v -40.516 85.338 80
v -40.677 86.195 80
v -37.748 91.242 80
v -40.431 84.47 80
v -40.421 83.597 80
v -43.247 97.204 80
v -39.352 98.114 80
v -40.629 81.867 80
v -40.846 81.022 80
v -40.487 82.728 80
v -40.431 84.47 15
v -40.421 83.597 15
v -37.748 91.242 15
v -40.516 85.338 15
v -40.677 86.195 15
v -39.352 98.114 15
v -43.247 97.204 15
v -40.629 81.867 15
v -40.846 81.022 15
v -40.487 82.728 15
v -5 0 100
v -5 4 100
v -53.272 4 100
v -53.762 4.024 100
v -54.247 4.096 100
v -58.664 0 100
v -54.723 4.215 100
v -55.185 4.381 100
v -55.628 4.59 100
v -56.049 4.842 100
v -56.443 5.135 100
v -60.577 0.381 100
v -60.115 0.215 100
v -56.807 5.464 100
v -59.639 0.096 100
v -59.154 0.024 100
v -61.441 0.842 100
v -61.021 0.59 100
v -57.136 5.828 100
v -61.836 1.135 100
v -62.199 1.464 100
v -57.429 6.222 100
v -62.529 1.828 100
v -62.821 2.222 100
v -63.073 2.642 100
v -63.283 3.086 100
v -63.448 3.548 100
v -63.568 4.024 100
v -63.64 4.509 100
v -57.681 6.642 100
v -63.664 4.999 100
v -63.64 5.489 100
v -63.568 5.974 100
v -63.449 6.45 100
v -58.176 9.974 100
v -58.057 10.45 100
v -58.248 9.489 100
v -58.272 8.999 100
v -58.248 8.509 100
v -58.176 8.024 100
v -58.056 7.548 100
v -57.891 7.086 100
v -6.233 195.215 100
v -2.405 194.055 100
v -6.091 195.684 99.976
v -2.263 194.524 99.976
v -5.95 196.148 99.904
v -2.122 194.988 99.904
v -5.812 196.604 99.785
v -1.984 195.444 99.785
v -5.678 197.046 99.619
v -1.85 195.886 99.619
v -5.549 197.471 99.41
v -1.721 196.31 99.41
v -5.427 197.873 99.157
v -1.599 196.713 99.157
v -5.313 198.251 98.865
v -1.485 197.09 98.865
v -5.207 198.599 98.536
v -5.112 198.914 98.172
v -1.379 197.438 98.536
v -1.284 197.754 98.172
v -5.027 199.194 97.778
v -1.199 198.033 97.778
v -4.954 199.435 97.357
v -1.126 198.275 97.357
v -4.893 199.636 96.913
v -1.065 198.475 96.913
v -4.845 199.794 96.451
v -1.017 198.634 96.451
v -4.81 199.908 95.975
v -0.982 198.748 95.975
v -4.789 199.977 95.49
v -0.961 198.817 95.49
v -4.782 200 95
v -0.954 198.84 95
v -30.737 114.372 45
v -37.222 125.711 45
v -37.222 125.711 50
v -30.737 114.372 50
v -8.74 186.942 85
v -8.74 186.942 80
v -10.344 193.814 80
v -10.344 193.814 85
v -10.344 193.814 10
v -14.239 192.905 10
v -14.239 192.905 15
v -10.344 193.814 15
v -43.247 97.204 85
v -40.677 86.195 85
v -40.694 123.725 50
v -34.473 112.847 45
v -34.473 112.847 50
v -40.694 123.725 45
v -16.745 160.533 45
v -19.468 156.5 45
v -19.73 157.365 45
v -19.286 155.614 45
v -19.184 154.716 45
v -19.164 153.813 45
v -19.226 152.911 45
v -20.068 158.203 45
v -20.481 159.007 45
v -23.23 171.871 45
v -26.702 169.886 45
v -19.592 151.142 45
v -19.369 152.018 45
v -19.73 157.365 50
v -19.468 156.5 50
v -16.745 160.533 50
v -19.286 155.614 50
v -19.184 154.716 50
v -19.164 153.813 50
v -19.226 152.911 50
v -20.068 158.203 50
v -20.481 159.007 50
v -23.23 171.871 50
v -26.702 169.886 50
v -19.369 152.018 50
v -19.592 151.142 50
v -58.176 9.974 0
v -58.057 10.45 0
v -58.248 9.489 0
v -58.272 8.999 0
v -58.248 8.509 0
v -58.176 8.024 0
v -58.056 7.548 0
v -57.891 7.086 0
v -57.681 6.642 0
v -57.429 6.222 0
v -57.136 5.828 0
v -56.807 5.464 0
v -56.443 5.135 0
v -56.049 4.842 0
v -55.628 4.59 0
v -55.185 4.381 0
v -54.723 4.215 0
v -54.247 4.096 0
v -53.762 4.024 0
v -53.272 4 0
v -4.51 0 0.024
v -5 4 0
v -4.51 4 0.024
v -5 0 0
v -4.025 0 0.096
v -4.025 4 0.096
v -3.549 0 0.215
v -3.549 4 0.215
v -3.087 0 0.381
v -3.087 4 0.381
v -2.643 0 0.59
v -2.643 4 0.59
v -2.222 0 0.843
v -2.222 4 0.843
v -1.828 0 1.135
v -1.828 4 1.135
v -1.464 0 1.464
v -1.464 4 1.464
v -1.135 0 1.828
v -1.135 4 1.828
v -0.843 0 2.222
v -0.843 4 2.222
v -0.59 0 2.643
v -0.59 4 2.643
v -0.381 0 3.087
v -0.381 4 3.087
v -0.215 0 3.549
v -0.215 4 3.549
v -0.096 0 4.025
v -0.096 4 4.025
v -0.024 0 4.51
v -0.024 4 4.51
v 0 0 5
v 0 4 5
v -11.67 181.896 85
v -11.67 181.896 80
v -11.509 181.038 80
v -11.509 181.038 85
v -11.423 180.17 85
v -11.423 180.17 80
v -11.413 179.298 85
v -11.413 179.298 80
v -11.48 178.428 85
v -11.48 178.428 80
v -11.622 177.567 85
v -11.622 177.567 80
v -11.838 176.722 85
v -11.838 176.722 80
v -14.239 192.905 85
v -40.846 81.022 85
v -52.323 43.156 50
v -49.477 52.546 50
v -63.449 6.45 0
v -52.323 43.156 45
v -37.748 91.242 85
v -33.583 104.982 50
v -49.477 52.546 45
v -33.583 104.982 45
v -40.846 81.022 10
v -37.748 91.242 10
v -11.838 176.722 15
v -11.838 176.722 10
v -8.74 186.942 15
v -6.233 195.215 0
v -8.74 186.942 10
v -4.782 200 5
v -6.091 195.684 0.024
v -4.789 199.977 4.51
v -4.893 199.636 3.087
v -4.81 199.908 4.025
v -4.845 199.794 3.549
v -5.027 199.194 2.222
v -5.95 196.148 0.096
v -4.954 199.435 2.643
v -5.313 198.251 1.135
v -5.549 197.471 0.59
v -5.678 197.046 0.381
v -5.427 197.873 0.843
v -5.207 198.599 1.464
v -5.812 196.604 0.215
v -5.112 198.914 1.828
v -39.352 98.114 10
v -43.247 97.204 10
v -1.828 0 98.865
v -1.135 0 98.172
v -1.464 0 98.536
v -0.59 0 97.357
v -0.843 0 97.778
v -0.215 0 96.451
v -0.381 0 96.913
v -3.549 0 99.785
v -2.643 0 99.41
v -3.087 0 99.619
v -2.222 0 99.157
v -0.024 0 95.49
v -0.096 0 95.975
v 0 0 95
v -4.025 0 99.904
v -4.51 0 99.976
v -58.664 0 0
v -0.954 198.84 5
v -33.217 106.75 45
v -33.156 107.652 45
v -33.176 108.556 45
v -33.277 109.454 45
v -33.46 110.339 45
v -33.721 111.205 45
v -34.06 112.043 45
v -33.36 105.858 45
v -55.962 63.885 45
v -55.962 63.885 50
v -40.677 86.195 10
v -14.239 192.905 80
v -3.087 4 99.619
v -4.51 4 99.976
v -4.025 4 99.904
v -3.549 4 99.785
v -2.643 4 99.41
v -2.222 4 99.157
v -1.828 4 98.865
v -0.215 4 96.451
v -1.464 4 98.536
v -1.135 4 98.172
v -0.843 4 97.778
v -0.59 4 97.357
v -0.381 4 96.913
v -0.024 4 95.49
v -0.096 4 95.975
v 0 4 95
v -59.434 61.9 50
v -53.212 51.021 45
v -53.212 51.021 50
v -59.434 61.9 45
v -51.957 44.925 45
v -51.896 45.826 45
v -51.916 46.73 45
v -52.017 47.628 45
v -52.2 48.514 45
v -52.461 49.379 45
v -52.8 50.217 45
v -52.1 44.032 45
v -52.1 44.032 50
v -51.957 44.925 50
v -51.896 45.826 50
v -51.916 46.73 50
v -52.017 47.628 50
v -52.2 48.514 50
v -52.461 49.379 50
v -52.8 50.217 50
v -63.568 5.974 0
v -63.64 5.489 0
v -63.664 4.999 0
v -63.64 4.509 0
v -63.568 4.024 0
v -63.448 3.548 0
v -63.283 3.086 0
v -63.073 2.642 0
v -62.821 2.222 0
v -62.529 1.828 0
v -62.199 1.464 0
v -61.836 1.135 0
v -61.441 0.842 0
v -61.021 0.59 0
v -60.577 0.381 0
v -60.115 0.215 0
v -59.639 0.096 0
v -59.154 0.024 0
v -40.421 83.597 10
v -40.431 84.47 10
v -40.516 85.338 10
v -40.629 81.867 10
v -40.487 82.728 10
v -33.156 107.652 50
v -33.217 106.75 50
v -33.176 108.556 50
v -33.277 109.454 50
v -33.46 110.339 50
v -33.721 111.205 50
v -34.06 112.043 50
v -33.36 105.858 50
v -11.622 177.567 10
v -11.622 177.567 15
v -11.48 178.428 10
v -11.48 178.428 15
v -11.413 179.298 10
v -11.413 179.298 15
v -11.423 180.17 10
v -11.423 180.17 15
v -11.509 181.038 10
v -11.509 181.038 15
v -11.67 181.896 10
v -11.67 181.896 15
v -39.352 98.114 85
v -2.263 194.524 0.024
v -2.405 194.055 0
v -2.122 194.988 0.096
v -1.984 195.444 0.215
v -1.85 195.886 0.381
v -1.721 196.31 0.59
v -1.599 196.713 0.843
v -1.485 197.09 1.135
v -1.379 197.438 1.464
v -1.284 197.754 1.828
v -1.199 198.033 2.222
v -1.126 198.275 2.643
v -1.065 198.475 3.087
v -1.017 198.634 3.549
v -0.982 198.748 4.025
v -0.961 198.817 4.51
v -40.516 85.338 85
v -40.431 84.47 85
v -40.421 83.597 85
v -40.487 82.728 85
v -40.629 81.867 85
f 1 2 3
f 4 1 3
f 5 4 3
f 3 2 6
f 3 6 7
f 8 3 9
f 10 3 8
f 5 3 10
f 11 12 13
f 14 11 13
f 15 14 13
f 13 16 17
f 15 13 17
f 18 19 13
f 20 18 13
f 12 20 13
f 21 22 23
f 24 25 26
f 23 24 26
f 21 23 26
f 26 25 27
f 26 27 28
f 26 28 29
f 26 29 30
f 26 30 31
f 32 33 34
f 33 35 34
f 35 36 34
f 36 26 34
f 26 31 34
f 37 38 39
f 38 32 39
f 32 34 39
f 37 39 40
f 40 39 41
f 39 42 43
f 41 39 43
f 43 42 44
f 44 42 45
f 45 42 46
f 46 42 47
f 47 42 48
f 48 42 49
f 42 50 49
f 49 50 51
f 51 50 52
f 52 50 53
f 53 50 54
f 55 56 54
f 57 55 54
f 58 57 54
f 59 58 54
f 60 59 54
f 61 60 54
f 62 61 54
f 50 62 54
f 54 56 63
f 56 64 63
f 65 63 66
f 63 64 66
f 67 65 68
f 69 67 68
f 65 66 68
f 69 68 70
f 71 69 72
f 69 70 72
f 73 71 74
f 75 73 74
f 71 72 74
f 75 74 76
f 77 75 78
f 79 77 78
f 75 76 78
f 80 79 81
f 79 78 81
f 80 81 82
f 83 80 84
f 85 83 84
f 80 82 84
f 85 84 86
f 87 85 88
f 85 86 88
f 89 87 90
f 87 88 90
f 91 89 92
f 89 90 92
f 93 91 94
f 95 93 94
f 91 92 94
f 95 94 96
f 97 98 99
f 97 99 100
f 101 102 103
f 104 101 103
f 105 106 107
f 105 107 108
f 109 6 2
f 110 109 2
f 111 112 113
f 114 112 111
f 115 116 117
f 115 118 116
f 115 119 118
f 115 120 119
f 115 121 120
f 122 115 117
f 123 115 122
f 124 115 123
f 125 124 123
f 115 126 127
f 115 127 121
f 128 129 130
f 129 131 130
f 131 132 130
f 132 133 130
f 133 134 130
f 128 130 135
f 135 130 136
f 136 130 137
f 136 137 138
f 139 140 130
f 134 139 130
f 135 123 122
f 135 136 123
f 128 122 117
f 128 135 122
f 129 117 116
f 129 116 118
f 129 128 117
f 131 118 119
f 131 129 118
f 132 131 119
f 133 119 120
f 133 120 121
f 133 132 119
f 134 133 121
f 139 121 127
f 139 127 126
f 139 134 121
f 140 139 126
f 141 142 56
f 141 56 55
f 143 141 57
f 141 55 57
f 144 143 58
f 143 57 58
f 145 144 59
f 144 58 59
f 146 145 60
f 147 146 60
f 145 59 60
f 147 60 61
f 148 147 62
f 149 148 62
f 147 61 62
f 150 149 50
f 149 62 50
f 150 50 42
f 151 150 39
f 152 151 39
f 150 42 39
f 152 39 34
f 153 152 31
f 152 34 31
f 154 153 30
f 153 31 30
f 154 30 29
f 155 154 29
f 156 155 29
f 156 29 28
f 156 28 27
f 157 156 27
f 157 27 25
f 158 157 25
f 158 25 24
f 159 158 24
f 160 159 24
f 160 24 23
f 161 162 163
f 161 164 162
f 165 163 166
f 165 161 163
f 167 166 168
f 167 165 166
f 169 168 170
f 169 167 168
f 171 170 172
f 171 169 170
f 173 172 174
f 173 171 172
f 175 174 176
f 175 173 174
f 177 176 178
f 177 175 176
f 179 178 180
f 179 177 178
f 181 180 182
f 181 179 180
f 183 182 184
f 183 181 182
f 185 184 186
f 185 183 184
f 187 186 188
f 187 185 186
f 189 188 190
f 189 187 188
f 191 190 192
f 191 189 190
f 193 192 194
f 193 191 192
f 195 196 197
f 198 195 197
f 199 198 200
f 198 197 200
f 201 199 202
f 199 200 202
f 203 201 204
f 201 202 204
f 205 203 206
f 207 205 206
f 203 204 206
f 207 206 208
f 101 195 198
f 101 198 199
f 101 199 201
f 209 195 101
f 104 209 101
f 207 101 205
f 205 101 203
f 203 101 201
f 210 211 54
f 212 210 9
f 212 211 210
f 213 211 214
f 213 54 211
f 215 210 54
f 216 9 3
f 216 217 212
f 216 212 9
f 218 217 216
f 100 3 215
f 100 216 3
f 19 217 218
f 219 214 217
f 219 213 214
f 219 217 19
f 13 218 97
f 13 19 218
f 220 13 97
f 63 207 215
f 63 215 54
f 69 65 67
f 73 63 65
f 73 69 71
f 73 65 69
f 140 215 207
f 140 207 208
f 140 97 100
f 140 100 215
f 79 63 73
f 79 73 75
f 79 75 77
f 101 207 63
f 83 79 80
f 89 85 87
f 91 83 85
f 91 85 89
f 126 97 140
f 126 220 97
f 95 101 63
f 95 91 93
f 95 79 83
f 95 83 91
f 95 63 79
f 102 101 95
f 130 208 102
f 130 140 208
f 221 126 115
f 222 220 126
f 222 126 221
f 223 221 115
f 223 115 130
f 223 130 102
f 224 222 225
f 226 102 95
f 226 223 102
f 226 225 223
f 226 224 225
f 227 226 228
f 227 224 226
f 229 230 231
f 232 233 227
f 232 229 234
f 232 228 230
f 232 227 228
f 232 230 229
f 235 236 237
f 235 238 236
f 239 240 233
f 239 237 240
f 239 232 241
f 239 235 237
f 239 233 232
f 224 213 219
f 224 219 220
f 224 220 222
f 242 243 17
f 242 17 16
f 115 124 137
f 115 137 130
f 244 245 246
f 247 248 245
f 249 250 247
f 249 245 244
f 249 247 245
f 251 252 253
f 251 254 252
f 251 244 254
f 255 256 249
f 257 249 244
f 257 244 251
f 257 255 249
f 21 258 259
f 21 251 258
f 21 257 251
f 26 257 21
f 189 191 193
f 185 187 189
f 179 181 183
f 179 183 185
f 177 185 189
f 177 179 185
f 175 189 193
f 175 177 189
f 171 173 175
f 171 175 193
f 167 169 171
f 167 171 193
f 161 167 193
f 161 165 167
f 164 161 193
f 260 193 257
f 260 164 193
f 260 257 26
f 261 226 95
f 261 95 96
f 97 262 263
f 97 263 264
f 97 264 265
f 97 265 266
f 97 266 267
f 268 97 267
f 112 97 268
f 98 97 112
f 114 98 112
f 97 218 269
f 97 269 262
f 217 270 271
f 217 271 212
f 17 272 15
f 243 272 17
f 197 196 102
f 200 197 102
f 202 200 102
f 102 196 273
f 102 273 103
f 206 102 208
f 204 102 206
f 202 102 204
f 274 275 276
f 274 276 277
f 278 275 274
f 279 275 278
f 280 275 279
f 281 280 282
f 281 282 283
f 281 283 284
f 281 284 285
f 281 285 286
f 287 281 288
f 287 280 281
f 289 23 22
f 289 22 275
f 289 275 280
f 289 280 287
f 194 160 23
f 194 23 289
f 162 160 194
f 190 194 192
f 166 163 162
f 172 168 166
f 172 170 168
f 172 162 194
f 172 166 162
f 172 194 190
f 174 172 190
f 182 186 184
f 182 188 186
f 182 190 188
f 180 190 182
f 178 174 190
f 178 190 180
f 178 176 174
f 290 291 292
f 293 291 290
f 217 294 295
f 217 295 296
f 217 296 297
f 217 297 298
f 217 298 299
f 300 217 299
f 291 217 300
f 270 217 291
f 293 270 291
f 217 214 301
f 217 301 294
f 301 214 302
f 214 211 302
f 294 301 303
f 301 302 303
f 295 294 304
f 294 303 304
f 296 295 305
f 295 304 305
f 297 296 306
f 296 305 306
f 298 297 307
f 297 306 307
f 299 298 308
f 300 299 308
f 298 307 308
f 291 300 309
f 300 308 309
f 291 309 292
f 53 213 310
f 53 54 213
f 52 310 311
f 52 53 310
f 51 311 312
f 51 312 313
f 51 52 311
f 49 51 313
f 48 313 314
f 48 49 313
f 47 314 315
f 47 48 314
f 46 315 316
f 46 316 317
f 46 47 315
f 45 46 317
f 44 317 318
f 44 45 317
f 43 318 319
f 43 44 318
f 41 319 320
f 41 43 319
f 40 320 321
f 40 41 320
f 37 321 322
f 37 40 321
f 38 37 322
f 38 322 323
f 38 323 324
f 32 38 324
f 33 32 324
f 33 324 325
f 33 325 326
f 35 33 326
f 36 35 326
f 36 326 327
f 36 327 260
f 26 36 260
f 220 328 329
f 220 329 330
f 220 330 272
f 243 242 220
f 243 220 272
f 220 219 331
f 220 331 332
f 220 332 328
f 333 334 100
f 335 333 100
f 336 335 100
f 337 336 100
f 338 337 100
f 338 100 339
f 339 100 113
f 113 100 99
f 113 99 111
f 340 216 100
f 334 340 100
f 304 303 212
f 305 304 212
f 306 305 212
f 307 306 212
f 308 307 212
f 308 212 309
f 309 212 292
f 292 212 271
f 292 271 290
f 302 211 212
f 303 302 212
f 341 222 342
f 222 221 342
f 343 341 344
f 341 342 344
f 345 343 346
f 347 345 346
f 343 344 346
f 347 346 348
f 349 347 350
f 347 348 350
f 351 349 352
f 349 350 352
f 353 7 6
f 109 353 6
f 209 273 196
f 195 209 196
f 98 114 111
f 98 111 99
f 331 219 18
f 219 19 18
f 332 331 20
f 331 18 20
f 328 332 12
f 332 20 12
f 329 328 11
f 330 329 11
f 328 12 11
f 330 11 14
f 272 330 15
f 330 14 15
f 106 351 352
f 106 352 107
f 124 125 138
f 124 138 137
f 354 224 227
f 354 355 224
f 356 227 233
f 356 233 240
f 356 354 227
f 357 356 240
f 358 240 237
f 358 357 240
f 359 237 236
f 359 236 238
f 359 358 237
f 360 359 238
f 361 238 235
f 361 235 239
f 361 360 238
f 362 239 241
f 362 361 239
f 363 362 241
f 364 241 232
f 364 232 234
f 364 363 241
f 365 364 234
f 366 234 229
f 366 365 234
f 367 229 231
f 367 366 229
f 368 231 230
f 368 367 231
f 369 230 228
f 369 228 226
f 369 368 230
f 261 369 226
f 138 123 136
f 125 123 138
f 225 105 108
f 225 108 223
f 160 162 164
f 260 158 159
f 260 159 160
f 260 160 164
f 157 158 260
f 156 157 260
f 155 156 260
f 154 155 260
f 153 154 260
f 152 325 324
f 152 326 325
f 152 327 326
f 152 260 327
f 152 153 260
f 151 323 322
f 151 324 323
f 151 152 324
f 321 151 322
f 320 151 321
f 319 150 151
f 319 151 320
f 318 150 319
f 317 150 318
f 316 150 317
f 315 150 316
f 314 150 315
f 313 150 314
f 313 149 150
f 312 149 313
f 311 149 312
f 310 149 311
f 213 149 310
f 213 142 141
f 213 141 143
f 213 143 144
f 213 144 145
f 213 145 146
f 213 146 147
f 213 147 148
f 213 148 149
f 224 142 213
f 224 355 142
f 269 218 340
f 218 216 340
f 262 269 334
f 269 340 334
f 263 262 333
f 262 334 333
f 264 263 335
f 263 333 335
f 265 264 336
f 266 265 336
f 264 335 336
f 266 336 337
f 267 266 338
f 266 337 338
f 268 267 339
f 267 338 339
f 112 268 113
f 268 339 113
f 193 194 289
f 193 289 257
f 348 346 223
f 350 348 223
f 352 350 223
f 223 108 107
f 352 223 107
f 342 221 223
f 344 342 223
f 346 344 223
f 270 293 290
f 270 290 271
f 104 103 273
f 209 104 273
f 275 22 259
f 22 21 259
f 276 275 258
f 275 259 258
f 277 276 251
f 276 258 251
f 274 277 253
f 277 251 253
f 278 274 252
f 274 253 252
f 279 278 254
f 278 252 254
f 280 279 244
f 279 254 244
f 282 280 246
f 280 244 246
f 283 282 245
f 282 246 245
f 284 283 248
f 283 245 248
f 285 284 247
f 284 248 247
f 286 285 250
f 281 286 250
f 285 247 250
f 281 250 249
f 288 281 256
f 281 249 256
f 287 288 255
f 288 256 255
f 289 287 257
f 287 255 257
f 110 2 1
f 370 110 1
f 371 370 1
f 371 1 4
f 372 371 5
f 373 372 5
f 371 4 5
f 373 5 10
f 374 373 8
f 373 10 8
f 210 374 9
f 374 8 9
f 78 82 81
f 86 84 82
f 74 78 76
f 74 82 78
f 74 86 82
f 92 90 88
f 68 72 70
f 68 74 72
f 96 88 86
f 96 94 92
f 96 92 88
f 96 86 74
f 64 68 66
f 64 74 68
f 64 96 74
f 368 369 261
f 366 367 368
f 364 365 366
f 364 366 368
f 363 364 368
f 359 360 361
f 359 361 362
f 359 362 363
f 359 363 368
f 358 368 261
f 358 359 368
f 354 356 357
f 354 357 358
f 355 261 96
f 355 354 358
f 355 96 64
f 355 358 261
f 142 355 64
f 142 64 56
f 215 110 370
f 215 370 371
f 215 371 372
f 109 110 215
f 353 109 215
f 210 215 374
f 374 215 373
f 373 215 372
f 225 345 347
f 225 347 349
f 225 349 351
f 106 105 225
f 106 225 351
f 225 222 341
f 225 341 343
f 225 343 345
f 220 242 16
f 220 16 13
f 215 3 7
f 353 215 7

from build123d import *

# Parameters (mm, degrees)
EXTRU_MINCE1_DEPTH         = 100
EXTRU_MINCE2_DEPTH         = 5
EXTRU_MINCE3_DEPTH         = 5
CONG_1_R                   = 10
R_P_TITION_START           = 80
R_P_TITION_LIN_AIRE1_DEPTH = 5
CONG_2_R                   = 5


# Read off the part's stored shape, not the designer's step: Répétition linéaire1
with BuildPart() as part:
    # Esquisse1 → Extru.-Mince1 (new body)
    with BuildSketch(Plane.XY):
        Polygon((0, 0), (-65.404068622, 0), (-4.782306964, 200), (-0.954292763, 198.839695178), (-60.011920576, 4), (0, 4), align=None)
    extrude(amount=EXTRU_MINCE1_DEPTH)

    # Esquisse2 → Extru.-Mince2 (add)
    with BuildSketch(Plane.XY.offset(10)):
        Polygon((-11.060818094, 179.286279518), (-14.23934022, 192.904801434), (-10.344030265, 193.813955082), (-7.16550814, 180.195433166), align=None)
        Polygon((-40.068438655, 83.585924506), (-43.246960781, 97.204446422), (-39.351650826, 98.11360007), (-36.1731287, 84.495078154), align=None)
    extrude(amount=EXTRU_MINCE2_DEPTH)

    # Esquisse3 → Extru.-Mince3 (add)
    with BuildSketch(Plane.XY.offset(45)):
        Polygon((-18.341466727, 155.266361808), (-26.702263311, 169.885700914), (-23.229995746, 171.871489915), (-14.869199162, 157.252150809), align=None)
        Polygon((-32.333054107, 109.106082076), (-40.693850691, 123.725421182), (-37.221583126, 125.711210183), (-28.860786542, 111.091871077), align=None)
        Polygon((-51.073031786, 47.280172809), (-59.433828371, 61.899511915), (-55.961560806, 63.885300916), (-47.600764221, 49.26596181), align=None)
    extrude(amount=EXTRU_MINCE3_DEPTH)

    # Congé1
    cong_1_edges = [part.edges().sort_by_distance(p)[0] for p in [
        (-11.060818094, 179.286279518, 12.5),
        (-40.068438655, 83.585924506, 12.5),
        (-18.341466727, 155.266361808, 47.5),
        (-32.333054107, 109.106082076, 47.5),
        (-51.073031786, 47.280172809, 47.5),
    ]]
    fillet(cong_1_edges, radius=CONG_1_R)

    # Répétition linéaire1 outline → Répétition linéaire1 (add)
    with BuildSketch(Plane.XY.offset(R_P_TITION_START)):
        with BuildLine():
            Line((-40.845695505, 81.021641222), (-37.74782901, 91.241952907))
            Line((-37.74782901, 91.241952907), (-39.351650826, 98.11360007))
            Line((-39.351650826, 98.11360007), (-43.246960781, 97.204446422))
            Line((-43.246960781, 97.204446422), (-40.677456119, 86.195287398))
            ThreePointArc((-40.677456119, 86.195287398), (-40.421014092, 83.597389742), (-40.845695505, 81.021641222))
        make_face()
        with BuildLine():
            Line((-8.74020845, 186.942307919), (-10.344030265, 193.813955082))
            Line((-10.344030265, 193.813955082), (-14.23934022, 192.904801434))
            Line((-14.23934022, 192.904801434), (-11.669835559, 181.89564241))
            ThreePointArc((-11.669835559, 181.89564241), (-11.413393531, 179.297744754), (-11.838074945, 176.721996234))
            Line((-11.838074945, 176.721996234), (-8.74020845, 186.942307919))
        make_face()
    extrude(amount=R_P_TITION_LIN_AIRE1_DEPTH)

    # Congé2
    cong_2_edges = [part.edges().sort_by_distance(p)[0] for p in [
        (0, 2, 100),
        (0, 2, 0),
        (-2.868299864, 199.419847589, 0),
        (-2.868299864, 199.419847589, 100),
        (-60.011920576, 4, 50),
        (-65.404068622, 0, 50),
    ]]
    fillet(cong_2_edges, radius=CONG_2_R)


solid = part.part
